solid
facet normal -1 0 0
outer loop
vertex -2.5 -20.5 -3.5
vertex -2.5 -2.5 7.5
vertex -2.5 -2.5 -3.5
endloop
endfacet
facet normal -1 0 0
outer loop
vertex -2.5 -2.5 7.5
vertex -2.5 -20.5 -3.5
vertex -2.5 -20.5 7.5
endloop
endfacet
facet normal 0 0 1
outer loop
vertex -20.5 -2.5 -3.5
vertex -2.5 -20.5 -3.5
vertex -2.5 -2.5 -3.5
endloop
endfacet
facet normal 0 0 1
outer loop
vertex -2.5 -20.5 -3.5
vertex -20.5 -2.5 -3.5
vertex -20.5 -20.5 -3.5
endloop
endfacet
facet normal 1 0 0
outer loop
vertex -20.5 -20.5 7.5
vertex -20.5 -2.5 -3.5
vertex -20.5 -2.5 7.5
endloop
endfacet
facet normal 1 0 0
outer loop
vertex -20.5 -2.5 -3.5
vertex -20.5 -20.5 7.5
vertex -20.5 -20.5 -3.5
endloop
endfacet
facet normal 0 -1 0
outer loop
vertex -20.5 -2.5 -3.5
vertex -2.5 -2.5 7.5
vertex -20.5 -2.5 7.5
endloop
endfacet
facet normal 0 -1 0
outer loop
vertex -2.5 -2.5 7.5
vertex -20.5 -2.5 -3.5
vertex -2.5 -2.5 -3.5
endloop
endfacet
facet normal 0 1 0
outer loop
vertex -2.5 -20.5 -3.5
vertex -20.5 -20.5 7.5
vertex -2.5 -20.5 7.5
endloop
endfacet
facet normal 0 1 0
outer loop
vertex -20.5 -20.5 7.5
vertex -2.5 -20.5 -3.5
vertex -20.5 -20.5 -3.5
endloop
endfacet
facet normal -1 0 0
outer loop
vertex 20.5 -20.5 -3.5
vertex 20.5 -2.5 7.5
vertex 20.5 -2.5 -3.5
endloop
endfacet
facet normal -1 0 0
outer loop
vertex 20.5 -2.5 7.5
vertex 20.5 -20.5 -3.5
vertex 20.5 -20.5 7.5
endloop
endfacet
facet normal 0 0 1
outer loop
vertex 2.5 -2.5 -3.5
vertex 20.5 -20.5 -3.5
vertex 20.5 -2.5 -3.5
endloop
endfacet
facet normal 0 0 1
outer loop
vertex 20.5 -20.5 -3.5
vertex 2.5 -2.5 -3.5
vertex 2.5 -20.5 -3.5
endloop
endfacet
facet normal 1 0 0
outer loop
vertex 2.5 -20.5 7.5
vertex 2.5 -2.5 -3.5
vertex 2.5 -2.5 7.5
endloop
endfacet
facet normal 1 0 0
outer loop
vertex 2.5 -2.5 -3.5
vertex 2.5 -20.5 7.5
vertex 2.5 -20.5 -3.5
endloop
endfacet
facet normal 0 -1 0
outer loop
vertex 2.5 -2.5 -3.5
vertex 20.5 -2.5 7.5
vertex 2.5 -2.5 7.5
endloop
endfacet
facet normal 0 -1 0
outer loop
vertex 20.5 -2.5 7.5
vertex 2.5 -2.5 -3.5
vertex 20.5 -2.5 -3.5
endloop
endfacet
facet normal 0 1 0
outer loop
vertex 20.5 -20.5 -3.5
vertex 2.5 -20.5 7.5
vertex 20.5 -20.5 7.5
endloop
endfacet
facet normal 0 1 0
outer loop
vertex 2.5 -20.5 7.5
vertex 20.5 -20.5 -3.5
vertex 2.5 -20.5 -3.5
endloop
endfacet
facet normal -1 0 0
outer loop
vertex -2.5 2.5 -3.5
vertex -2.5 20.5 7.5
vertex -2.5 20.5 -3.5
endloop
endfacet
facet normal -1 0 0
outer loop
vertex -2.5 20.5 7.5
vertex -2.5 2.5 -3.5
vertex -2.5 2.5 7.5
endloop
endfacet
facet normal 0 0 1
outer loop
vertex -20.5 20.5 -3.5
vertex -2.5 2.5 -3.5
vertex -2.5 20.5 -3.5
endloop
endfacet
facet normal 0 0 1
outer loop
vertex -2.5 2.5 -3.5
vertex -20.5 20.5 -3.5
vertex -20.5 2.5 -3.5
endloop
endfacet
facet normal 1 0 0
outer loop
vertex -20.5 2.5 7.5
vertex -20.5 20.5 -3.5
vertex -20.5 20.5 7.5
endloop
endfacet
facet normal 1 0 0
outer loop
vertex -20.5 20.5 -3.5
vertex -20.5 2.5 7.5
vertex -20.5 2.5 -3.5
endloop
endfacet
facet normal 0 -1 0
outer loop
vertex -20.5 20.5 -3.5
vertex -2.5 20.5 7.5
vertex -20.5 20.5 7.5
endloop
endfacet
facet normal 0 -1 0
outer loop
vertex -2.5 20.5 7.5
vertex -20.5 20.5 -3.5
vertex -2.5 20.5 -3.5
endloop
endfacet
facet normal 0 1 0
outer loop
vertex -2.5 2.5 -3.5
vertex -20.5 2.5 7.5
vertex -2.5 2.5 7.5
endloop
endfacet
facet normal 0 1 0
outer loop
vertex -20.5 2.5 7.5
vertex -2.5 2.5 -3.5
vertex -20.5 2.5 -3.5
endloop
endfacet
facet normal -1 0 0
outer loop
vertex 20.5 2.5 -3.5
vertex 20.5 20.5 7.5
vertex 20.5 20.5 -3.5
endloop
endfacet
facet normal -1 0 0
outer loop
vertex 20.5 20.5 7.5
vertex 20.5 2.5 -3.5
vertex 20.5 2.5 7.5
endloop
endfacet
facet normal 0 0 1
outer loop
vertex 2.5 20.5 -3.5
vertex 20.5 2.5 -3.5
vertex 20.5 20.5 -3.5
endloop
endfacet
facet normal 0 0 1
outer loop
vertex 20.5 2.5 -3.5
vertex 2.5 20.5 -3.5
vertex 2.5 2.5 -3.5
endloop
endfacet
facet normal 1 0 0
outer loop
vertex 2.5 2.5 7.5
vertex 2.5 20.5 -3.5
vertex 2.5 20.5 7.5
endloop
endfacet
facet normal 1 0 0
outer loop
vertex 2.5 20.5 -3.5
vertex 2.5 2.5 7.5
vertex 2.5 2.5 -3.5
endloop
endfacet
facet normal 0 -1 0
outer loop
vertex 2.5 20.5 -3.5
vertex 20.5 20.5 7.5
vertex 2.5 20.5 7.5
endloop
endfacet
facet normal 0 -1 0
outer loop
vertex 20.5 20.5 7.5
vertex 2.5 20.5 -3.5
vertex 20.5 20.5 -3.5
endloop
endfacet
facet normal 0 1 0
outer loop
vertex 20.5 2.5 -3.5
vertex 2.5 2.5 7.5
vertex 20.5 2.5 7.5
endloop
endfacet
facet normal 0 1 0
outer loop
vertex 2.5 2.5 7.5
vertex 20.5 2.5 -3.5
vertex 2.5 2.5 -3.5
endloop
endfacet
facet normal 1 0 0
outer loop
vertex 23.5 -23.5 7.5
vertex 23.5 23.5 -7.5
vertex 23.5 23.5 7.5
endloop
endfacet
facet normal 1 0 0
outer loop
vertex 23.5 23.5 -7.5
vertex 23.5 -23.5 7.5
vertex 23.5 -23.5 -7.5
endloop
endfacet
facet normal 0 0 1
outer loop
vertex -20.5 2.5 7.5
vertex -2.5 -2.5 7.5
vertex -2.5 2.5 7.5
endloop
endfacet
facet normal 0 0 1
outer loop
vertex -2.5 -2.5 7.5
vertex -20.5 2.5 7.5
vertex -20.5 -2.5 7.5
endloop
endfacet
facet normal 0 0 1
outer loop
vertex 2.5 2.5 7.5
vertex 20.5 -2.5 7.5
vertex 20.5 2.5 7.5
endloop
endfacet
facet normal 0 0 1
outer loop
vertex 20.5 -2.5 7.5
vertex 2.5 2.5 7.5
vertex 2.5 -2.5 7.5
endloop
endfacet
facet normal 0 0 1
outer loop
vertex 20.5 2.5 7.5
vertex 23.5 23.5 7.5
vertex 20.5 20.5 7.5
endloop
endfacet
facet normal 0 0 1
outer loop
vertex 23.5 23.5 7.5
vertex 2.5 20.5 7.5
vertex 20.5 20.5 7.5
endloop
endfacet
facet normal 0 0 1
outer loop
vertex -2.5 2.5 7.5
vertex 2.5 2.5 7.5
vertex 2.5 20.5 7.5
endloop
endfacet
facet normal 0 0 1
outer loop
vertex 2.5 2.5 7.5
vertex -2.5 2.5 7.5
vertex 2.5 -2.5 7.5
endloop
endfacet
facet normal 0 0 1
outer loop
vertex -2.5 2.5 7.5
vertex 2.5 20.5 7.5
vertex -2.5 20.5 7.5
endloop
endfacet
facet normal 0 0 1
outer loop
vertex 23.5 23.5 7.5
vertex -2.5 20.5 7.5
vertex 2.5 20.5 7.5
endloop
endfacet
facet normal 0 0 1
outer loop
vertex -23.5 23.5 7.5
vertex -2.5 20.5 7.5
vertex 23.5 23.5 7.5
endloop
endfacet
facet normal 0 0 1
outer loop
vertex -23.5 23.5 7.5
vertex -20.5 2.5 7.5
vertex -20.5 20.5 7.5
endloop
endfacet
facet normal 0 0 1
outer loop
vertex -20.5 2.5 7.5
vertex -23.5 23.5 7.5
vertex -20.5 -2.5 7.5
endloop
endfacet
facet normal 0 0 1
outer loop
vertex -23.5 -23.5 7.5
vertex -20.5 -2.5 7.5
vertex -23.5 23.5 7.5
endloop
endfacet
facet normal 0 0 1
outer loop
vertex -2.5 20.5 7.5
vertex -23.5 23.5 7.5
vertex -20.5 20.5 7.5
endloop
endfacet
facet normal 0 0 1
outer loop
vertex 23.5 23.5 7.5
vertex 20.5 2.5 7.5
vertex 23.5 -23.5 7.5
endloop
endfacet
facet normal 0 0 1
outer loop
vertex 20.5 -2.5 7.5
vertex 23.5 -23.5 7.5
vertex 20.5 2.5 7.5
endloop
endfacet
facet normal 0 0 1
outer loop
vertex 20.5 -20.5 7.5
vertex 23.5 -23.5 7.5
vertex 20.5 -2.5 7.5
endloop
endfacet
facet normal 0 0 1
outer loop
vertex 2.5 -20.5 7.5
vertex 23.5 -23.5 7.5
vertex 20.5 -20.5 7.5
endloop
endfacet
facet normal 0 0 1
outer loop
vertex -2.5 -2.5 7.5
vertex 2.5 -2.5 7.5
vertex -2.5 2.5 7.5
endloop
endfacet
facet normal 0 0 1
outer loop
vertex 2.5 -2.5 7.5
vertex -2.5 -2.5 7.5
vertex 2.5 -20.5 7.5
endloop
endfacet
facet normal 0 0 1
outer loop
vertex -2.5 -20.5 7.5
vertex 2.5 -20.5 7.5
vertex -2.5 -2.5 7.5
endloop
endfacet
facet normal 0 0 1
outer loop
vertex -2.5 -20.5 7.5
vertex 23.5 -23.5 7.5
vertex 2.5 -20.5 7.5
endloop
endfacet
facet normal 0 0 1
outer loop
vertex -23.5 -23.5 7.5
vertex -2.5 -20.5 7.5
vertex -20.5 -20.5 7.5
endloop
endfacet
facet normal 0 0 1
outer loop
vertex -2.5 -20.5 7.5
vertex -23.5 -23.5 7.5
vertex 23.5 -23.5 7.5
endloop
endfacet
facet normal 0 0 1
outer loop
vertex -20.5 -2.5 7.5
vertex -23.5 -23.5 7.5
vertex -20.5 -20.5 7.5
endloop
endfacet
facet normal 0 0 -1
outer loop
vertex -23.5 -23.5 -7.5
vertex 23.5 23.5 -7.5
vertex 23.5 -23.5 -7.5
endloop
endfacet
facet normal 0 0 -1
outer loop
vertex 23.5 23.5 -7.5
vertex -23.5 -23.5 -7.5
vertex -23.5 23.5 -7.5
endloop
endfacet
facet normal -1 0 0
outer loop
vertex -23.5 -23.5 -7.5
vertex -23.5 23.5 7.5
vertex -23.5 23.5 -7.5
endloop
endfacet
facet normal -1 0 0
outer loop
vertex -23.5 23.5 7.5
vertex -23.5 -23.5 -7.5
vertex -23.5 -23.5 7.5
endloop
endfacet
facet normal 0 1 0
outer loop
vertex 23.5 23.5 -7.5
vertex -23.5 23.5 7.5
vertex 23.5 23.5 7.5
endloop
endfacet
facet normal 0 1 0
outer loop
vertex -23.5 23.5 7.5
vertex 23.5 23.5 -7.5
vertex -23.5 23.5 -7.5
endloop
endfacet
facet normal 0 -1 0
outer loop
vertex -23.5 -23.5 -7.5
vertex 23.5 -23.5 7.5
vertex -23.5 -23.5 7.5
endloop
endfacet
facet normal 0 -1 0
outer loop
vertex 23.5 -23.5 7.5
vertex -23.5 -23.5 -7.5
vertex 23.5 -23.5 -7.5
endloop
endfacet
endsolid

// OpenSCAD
$fn = 32;

// ----------------------------------------------------------------------
// Pocket plate 47 x 47 x 15
// 2 x 2 pockets 18 mm square, 11 mm deep
// ----------------------------------------------------------------------

// --- parameters (mm) ---
thickness = 15;  // plate thickness
floor_t = 4;     // material left under each pocket
pocket = 18;     // pocket side length
pitch_x = 23;    // pocket pitch along X
pitch_y = 23;    // pocket pitch along Y
cols = 2;        // pockets per row
rows = 2;        // rows of pockets

// --- derived feature positions (mm) ---
depth = thickness - floor_t;        // = 11   pocket depth, down to the floor
span_x = (cols - 1) * pitch_x;      // = 23   distance between outer pockets
span_y = (rows - 1) * pitch_y;      // = 23   distance between outer pocket rows
origin_x = -span_x / 2;             // = -11.5   X of the first pocket
origin_y = -span_y / 2;             // = -11.5   Y of the first pocket
plate = [span_x + pocket + 6, span_y + pocket + 6, thickness];  // = [47, 47, 15]   overall size: pockets plus 3 mm of wall on each side
feature_centers = [
  [origin_x + 0 * pitch_x, origin_y + 0 * pitch_y],
  [origin_x + 1 * pitch_x, origin_y + 0 * pitch_y],
  [origin_x + 0 * pitch_x, origin_y + 1 * pitch_y],
  [origin_x + 1 * pitch_x, origin_y + 1 * pitch_y]
];   // pocket centres, used verbatim by the cutter loop

// plate outline, then one pocket per centre in feature_centers
difference() {
  cube(plate, center = true);
  for (centre = feature_centers)
    translate([centre[0] - pocket / 2, centre[1] - pocket / 2, plate[2] / 2 - depth])
      cube([pocket, pocket, depth + 1]);  // centred on the declared pocket centre
}
